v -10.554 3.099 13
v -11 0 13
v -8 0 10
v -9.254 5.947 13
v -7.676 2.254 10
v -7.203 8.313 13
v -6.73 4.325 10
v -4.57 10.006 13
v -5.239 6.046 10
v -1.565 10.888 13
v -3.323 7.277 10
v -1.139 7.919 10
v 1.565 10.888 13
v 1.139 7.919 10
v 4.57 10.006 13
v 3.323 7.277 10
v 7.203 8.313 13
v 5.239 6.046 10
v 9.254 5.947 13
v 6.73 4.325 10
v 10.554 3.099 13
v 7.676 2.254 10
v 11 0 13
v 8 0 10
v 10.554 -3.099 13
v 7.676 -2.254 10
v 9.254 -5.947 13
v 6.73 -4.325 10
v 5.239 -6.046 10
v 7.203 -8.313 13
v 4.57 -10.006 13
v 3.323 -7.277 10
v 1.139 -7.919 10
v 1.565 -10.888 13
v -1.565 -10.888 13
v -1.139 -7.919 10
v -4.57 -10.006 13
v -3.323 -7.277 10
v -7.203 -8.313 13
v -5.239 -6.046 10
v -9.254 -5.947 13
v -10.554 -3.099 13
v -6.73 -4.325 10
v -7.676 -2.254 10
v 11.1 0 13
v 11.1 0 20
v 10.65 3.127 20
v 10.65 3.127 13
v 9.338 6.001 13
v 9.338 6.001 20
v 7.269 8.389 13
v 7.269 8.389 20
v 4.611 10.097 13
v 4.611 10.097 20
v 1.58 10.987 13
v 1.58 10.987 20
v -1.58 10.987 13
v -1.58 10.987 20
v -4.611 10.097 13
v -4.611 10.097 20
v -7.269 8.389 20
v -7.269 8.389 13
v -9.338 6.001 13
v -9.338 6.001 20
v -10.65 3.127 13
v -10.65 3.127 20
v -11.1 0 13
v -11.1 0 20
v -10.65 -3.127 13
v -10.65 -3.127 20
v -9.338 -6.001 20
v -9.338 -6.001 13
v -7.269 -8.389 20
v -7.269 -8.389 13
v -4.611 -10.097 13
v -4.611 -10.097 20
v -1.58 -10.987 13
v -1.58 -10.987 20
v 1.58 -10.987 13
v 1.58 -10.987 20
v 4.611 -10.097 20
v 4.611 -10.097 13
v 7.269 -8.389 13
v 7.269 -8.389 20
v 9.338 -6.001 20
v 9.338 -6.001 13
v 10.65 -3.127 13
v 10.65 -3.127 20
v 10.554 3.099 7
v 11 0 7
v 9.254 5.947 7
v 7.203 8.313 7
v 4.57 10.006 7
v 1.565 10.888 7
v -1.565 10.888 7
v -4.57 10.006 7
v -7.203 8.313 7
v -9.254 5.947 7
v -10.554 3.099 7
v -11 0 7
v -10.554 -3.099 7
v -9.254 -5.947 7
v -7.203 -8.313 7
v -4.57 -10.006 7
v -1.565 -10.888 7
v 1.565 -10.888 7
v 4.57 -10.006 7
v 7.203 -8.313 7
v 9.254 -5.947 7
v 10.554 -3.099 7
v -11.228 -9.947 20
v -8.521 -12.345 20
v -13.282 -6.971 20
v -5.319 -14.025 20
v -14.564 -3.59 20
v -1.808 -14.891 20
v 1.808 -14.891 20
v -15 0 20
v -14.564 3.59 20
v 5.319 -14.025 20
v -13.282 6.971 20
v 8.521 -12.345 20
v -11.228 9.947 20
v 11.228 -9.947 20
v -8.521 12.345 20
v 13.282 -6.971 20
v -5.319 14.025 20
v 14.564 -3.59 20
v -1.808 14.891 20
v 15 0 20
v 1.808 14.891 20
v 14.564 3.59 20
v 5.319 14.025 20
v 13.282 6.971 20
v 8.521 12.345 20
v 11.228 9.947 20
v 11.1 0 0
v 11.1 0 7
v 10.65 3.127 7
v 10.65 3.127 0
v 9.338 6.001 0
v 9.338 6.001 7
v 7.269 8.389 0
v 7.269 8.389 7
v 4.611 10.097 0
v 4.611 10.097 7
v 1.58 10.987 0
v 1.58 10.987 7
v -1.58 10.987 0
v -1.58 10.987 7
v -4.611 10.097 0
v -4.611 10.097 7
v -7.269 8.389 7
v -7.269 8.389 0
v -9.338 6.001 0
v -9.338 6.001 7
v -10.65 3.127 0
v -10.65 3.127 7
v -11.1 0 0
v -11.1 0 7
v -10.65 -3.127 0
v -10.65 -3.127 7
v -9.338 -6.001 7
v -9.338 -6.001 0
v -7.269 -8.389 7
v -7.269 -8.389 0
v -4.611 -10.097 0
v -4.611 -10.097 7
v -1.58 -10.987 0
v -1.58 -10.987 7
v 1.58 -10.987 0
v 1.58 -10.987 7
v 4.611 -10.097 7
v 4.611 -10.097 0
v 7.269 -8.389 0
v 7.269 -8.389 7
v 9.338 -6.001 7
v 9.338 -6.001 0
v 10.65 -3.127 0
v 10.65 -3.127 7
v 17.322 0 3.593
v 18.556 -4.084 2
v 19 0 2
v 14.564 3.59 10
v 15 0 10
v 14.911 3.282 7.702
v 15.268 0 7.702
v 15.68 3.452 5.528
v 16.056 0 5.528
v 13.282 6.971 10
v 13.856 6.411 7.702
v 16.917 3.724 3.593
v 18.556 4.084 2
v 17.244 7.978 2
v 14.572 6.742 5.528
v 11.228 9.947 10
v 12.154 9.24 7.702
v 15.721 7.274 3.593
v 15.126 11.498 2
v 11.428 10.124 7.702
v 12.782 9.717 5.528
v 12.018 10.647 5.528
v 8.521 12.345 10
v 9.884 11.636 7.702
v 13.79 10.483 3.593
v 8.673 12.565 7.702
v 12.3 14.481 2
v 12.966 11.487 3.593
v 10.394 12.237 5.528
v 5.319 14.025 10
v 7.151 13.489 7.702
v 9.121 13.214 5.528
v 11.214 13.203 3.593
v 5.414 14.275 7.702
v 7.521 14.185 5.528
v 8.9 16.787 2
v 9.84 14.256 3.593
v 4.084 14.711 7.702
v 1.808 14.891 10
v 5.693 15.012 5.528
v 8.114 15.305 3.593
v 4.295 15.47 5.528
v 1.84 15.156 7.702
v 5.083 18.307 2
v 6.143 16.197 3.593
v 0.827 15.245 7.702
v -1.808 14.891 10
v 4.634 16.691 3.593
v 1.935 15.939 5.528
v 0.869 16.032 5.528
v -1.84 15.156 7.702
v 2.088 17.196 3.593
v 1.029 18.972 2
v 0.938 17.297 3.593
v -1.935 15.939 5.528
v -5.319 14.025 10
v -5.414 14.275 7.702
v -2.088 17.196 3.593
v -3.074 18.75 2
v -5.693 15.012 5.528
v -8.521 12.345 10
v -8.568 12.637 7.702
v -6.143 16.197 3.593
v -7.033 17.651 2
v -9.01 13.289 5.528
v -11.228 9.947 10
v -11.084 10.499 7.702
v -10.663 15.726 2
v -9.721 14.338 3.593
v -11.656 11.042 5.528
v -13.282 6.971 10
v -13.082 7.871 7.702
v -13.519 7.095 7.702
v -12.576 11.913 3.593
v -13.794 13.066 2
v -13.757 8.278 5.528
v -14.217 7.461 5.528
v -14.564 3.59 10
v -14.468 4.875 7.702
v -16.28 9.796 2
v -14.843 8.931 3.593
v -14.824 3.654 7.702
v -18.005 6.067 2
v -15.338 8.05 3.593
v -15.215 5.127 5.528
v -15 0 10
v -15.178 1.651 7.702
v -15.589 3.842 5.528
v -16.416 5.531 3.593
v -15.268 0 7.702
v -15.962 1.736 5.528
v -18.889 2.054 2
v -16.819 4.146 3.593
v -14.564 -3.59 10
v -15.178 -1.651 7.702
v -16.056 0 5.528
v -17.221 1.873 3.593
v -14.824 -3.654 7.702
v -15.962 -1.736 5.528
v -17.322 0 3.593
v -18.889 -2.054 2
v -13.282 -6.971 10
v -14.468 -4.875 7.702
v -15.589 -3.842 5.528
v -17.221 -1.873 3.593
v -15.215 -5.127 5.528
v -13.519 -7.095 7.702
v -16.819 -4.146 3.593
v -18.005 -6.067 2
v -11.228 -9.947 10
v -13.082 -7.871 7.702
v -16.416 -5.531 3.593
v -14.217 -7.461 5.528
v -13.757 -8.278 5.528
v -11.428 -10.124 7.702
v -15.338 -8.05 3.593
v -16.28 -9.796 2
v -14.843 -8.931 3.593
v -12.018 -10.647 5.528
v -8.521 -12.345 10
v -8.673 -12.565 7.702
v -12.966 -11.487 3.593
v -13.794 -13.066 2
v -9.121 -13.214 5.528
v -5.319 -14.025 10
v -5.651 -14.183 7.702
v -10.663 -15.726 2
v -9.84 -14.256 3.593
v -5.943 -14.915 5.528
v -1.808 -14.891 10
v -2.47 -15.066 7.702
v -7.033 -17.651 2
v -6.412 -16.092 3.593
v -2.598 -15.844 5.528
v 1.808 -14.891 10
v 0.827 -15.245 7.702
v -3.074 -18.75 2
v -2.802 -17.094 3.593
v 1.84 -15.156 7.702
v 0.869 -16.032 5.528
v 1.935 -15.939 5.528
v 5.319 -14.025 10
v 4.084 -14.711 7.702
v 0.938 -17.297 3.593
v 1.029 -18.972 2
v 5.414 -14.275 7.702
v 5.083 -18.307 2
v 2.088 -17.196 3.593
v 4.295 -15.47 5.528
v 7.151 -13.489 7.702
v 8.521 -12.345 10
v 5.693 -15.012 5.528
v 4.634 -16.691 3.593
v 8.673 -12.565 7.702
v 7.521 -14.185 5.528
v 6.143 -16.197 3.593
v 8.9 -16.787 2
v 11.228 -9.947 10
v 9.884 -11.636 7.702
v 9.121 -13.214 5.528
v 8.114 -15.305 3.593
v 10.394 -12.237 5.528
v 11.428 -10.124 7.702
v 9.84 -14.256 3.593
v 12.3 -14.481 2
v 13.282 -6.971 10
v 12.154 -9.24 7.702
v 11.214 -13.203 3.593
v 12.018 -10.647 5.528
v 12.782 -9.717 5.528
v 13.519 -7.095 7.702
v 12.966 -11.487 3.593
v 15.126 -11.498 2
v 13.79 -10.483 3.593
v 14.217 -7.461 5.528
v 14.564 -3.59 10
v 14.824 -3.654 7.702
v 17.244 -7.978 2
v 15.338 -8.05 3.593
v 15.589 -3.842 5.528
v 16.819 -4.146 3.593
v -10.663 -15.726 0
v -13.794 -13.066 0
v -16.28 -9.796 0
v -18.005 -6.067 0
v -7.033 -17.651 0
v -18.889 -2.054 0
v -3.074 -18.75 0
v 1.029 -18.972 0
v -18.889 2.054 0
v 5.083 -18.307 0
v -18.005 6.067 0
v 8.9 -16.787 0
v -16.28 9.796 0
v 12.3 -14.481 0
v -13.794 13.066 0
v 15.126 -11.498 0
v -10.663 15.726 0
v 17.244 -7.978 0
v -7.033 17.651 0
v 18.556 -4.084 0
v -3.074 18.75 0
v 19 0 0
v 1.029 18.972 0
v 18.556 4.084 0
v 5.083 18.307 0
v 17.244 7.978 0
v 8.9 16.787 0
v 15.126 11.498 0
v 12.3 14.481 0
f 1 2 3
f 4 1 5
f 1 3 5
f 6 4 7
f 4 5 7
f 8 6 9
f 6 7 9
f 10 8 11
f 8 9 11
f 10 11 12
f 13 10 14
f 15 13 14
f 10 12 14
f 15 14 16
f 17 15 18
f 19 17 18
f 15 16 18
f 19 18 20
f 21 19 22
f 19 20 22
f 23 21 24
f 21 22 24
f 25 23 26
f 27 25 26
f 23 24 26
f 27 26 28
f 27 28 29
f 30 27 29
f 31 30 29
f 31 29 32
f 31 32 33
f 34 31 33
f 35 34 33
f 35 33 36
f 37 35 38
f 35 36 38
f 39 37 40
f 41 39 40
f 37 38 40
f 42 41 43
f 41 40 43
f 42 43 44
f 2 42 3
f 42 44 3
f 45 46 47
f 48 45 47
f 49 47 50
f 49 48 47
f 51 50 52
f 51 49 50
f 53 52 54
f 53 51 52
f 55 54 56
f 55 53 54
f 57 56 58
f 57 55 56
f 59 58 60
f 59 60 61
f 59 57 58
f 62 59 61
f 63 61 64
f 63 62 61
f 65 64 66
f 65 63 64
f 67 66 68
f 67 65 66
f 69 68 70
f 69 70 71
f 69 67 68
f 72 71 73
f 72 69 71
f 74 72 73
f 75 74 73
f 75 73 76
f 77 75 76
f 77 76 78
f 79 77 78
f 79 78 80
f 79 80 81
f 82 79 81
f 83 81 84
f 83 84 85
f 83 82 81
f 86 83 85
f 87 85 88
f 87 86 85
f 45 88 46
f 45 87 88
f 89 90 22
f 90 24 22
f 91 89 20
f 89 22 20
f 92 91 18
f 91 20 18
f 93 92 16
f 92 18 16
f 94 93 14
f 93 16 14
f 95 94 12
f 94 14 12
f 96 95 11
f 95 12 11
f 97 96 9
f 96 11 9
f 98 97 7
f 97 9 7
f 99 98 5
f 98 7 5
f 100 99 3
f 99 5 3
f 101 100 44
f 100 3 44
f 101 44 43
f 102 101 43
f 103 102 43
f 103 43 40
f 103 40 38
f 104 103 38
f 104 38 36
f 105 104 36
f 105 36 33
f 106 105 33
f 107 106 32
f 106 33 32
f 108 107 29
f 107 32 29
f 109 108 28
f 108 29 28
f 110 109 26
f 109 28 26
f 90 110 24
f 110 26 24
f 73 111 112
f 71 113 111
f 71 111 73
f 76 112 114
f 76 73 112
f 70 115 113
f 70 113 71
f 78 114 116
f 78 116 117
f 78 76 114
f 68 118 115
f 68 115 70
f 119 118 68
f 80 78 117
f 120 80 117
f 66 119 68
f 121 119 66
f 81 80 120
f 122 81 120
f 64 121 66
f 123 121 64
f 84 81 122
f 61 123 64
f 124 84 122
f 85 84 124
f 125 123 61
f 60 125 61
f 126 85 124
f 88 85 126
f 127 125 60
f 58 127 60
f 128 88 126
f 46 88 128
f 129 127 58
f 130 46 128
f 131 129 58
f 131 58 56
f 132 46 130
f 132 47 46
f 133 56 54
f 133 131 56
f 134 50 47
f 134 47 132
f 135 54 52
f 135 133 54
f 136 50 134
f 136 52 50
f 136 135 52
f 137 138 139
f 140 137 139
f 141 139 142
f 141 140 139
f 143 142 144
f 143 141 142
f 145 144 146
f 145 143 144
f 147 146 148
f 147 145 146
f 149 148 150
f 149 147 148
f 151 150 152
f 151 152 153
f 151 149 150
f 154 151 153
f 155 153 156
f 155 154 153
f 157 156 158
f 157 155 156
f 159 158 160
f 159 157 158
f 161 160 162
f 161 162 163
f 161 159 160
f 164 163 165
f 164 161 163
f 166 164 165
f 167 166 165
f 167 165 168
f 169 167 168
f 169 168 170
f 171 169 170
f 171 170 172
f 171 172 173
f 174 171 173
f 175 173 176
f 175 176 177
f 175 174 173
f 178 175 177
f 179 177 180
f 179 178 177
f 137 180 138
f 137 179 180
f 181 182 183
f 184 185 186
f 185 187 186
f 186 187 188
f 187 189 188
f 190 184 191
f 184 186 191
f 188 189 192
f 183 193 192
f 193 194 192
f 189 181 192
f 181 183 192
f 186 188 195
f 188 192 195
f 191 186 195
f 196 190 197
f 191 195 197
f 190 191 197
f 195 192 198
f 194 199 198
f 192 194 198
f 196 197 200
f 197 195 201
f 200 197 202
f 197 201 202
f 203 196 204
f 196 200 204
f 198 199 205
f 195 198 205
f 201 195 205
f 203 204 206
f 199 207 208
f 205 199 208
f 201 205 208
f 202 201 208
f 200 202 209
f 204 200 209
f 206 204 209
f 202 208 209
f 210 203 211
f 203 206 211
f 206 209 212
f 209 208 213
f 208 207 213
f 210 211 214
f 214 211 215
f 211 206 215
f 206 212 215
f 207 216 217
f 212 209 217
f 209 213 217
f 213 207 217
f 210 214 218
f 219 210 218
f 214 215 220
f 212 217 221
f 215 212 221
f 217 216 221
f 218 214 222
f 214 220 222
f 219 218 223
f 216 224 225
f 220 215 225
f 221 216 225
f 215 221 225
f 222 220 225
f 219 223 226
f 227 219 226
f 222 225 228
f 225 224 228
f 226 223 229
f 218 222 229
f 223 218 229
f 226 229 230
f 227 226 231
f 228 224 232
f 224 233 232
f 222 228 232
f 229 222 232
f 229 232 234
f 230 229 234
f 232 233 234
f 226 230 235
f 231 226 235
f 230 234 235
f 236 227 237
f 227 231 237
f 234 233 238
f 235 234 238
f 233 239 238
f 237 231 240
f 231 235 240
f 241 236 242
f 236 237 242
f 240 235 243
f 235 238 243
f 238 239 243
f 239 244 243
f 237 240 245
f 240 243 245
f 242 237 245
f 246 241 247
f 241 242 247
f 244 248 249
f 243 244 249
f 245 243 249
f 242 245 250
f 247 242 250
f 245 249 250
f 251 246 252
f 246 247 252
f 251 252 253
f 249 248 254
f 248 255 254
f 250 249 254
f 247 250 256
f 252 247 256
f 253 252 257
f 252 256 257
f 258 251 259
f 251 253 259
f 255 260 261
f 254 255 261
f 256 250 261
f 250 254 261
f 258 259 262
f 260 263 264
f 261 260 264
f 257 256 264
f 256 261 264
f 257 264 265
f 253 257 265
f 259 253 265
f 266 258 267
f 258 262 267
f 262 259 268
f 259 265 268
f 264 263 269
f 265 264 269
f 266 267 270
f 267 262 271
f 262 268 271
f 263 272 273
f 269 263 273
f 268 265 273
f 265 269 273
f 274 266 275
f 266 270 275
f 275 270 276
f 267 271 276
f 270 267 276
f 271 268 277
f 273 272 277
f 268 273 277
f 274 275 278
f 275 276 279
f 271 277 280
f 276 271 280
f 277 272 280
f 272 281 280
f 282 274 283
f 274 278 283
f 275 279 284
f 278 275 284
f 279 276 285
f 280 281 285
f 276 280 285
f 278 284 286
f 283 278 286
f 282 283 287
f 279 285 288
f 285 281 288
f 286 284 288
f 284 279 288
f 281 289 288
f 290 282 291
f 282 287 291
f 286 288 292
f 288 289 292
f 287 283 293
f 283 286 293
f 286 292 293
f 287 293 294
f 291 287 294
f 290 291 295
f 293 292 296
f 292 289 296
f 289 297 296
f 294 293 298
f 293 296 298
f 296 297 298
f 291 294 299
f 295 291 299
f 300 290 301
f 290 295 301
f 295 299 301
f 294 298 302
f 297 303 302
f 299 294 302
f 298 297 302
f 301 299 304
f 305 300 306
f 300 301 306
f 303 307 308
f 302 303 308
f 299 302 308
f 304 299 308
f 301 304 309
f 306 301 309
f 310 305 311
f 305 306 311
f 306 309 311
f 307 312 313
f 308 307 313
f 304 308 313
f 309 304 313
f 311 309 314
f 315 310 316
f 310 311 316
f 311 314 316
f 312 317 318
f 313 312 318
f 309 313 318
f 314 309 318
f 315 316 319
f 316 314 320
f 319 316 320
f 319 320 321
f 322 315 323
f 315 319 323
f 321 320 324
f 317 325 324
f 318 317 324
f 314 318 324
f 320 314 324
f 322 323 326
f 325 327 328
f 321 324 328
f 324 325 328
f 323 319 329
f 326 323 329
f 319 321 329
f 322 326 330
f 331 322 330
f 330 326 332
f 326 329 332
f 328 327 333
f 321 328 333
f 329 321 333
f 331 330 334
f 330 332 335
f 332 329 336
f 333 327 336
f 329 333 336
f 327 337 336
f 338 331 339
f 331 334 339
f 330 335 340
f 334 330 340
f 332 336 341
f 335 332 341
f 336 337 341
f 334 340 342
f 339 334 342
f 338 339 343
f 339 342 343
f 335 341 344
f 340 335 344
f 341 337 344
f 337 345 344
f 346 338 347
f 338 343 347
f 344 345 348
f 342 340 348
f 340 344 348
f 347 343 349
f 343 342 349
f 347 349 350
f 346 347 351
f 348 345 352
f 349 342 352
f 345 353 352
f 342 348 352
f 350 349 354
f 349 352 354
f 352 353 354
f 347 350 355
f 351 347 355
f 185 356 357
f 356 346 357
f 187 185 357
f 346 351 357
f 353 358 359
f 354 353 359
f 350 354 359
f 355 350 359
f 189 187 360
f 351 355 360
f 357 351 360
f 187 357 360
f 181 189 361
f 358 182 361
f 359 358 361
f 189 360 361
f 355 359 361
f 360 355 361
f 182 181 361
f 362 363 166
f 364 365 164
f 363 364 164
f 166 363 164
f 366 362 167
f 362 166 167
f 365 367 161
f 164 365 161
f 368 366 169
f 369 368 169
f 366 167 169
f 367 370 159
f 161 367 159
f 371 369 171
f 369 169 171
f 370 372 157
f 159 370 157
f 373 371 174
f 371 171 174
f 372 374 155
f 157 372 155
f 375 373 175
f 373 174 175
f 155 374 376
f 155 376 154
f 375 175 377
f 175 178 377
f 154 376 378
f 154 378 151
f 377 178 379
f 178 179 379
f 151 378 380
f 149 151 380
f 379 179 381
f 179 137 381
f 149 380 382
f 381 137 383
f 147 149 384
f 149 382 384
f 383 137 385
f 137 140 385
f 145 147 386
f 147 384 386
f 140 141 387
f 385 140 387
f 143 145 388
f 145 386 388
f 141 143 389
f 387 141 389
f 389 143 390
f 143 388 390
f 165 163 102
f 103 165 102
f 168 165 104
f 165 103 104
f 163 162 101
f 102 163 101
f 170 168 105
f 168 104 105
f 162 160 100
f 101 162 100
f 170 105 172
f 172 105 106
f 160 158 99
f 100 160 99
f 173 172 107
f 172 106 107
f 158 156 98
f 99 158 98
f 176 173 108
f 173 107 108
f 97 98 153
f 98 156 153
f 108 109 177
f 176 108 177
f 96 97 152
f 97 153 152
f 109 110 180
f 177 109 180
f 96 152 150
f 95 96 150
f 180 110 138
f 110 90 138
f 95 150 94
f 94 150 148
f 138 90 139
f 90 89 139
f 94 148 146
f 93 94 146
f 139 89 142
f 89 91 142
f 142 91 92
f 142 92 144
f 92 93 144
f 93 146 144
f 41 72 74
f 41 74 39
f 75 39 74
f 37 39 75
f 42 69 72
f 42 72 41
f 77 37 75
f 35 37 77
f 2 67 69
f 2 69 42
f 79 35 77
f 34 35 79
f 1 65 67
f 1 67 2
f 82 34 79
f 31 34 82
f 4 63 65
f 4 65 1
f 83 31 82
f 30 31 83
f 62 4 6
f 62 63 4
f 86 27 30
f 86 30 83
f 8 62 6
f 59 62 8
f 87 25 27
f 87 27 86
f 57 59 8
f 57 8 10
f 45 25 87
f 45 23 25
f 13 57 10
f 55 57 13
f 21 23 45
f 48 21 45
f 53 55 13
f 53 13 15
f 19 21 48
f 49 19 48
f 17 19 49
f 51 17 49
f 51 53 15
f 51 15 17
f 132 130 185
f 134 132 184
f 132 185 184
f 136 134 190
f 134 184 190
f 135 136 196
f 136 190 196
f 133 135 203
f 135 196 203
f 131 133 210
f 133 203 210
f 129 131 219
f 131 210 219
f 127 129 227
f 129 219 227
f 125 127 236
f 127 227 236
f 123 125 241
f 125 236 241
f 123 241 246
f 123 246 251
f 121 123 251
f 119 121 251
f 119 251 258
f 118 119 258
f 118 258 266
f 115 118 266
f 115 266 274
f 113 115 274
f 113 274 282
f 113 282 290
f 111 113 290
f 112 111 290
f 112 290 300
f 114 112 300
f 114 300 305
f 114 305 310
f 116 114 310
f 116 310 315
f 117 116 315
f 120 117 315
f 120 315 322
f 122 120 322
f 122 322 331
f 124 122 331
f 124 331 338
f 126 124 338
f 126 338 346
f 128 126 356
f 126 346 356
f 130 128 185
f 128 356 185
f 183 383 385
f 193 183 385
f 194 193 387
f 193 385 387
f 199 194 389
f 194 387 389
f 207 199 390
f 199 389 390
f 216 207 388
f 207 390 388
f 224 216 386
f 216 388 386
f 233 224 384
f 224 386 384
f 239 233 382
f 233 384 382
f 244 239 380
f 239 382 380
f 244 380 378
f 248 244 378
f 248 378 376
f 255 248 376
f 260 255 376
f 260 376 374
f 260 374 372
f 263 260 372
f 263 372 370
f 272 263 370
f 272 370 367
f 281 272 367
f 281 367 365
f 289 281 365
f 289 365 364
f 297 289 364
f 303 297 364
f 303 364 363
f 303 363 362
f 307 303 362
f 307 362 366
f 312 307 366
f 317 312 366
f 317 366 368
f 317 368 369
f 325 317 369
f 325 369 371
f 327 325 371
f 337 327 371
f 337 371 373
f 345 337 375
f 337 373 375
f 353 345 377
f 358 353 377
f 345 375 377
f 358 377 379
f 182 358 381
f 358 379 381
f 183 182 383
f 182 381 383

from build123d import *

# Parameters (mm, degrees)
CYLINDER002_R     = 11.1
CYLINDER002_DEPTH = 7
TORUS002_R        = 10
CYLINDER001_R     = 11.1
CYLINDER001_DEPTH = 7
CYLINDER_R        = 15
CYLINDER_DEPTH    = 20
CYLINDER003_R     = 19
CYLINDER003_DEPTH = 10


with BuildPart() as cylinder002:
    # Cylinder002 → Cylinder002 (new body)
    with BuildSketch(Plane.XY.offset(13)):
        Circle(CYLINDER002_R)
    extrude(amount=CYLINDER002_DEPTH)


with BuildPart() as cone:
    # Cone → Cone (revolve)
    with BuildSketch(Plane(origin=(0, 0, 7), x_dir=(1, 0, 0), z_dir=(0, -1, 0))):
        Polygon((0, 0), (11, 0), (0, 11), align=None)
    revolve(axis=Axis((0, 0, 7), (0, 0, 1)))


with BuildPart() as cone001:
    # Cone001 → Cone001 (revolve)
    with BuildSketch(Plane(origin=(0, 0, 13), x_dir=(-1, 0, 0), z_dir=(0, -1, 0))):
        Polygon((0, 0), (11, 0), (0, 11), align=None)
    revolve(axis=Axis((0, 0, 13), (0, 0, -1)))


with BuildPart() as torus002:
    # Torus002 → Torus002 (revolve)
    with BuildSketch(Plane(origin=(0, 0, 10), x_dir=(1, 0, 0), z_dir=(0, -1, 0))):
        with Locations((25, 0)):
            Circle(TORUS002_R)
    revolve(axis=Axis((0, 0, 10), (0, 0, 1)))


with BuildPart() as negativefusion:
    # Cylinder001 → Cylinder001 (new body)
    with BuildSketch(Plane.XY):
        Circle(CYLINDER001_R)
    extrude(amount=CYLINDER001_DEPTH)

    # Fusion: union Cylinder002, Cone, Cone001, Torus002
    add(cylinder002.part)
    add(cone.part)
    add(cone001.part)
    add(torus002.part)


with BuildPart() as cylinder:
    # Cylinder → Cylinder (new body)
    with BuildSketch(Plane.XY):
        Circle(CYLINDER_R)
    extrude(amount=CYLINDER_DEPTH)


with BuildPart() as cut:
    # Cylinder003 → Cylinder003 (new body)
    with BuildSketch(Plane.XY):
        Circle(CYLINDER003_R)
    extrude(amount=CYLINDER003_DEPTH)

    # Fusion001: union Cylinder
    add(cylinder.part)

    # Cut: cut NegativeFusion
    add(negativefusion.part, mode=Mode.SUBTRACT)


solid = cut.part
